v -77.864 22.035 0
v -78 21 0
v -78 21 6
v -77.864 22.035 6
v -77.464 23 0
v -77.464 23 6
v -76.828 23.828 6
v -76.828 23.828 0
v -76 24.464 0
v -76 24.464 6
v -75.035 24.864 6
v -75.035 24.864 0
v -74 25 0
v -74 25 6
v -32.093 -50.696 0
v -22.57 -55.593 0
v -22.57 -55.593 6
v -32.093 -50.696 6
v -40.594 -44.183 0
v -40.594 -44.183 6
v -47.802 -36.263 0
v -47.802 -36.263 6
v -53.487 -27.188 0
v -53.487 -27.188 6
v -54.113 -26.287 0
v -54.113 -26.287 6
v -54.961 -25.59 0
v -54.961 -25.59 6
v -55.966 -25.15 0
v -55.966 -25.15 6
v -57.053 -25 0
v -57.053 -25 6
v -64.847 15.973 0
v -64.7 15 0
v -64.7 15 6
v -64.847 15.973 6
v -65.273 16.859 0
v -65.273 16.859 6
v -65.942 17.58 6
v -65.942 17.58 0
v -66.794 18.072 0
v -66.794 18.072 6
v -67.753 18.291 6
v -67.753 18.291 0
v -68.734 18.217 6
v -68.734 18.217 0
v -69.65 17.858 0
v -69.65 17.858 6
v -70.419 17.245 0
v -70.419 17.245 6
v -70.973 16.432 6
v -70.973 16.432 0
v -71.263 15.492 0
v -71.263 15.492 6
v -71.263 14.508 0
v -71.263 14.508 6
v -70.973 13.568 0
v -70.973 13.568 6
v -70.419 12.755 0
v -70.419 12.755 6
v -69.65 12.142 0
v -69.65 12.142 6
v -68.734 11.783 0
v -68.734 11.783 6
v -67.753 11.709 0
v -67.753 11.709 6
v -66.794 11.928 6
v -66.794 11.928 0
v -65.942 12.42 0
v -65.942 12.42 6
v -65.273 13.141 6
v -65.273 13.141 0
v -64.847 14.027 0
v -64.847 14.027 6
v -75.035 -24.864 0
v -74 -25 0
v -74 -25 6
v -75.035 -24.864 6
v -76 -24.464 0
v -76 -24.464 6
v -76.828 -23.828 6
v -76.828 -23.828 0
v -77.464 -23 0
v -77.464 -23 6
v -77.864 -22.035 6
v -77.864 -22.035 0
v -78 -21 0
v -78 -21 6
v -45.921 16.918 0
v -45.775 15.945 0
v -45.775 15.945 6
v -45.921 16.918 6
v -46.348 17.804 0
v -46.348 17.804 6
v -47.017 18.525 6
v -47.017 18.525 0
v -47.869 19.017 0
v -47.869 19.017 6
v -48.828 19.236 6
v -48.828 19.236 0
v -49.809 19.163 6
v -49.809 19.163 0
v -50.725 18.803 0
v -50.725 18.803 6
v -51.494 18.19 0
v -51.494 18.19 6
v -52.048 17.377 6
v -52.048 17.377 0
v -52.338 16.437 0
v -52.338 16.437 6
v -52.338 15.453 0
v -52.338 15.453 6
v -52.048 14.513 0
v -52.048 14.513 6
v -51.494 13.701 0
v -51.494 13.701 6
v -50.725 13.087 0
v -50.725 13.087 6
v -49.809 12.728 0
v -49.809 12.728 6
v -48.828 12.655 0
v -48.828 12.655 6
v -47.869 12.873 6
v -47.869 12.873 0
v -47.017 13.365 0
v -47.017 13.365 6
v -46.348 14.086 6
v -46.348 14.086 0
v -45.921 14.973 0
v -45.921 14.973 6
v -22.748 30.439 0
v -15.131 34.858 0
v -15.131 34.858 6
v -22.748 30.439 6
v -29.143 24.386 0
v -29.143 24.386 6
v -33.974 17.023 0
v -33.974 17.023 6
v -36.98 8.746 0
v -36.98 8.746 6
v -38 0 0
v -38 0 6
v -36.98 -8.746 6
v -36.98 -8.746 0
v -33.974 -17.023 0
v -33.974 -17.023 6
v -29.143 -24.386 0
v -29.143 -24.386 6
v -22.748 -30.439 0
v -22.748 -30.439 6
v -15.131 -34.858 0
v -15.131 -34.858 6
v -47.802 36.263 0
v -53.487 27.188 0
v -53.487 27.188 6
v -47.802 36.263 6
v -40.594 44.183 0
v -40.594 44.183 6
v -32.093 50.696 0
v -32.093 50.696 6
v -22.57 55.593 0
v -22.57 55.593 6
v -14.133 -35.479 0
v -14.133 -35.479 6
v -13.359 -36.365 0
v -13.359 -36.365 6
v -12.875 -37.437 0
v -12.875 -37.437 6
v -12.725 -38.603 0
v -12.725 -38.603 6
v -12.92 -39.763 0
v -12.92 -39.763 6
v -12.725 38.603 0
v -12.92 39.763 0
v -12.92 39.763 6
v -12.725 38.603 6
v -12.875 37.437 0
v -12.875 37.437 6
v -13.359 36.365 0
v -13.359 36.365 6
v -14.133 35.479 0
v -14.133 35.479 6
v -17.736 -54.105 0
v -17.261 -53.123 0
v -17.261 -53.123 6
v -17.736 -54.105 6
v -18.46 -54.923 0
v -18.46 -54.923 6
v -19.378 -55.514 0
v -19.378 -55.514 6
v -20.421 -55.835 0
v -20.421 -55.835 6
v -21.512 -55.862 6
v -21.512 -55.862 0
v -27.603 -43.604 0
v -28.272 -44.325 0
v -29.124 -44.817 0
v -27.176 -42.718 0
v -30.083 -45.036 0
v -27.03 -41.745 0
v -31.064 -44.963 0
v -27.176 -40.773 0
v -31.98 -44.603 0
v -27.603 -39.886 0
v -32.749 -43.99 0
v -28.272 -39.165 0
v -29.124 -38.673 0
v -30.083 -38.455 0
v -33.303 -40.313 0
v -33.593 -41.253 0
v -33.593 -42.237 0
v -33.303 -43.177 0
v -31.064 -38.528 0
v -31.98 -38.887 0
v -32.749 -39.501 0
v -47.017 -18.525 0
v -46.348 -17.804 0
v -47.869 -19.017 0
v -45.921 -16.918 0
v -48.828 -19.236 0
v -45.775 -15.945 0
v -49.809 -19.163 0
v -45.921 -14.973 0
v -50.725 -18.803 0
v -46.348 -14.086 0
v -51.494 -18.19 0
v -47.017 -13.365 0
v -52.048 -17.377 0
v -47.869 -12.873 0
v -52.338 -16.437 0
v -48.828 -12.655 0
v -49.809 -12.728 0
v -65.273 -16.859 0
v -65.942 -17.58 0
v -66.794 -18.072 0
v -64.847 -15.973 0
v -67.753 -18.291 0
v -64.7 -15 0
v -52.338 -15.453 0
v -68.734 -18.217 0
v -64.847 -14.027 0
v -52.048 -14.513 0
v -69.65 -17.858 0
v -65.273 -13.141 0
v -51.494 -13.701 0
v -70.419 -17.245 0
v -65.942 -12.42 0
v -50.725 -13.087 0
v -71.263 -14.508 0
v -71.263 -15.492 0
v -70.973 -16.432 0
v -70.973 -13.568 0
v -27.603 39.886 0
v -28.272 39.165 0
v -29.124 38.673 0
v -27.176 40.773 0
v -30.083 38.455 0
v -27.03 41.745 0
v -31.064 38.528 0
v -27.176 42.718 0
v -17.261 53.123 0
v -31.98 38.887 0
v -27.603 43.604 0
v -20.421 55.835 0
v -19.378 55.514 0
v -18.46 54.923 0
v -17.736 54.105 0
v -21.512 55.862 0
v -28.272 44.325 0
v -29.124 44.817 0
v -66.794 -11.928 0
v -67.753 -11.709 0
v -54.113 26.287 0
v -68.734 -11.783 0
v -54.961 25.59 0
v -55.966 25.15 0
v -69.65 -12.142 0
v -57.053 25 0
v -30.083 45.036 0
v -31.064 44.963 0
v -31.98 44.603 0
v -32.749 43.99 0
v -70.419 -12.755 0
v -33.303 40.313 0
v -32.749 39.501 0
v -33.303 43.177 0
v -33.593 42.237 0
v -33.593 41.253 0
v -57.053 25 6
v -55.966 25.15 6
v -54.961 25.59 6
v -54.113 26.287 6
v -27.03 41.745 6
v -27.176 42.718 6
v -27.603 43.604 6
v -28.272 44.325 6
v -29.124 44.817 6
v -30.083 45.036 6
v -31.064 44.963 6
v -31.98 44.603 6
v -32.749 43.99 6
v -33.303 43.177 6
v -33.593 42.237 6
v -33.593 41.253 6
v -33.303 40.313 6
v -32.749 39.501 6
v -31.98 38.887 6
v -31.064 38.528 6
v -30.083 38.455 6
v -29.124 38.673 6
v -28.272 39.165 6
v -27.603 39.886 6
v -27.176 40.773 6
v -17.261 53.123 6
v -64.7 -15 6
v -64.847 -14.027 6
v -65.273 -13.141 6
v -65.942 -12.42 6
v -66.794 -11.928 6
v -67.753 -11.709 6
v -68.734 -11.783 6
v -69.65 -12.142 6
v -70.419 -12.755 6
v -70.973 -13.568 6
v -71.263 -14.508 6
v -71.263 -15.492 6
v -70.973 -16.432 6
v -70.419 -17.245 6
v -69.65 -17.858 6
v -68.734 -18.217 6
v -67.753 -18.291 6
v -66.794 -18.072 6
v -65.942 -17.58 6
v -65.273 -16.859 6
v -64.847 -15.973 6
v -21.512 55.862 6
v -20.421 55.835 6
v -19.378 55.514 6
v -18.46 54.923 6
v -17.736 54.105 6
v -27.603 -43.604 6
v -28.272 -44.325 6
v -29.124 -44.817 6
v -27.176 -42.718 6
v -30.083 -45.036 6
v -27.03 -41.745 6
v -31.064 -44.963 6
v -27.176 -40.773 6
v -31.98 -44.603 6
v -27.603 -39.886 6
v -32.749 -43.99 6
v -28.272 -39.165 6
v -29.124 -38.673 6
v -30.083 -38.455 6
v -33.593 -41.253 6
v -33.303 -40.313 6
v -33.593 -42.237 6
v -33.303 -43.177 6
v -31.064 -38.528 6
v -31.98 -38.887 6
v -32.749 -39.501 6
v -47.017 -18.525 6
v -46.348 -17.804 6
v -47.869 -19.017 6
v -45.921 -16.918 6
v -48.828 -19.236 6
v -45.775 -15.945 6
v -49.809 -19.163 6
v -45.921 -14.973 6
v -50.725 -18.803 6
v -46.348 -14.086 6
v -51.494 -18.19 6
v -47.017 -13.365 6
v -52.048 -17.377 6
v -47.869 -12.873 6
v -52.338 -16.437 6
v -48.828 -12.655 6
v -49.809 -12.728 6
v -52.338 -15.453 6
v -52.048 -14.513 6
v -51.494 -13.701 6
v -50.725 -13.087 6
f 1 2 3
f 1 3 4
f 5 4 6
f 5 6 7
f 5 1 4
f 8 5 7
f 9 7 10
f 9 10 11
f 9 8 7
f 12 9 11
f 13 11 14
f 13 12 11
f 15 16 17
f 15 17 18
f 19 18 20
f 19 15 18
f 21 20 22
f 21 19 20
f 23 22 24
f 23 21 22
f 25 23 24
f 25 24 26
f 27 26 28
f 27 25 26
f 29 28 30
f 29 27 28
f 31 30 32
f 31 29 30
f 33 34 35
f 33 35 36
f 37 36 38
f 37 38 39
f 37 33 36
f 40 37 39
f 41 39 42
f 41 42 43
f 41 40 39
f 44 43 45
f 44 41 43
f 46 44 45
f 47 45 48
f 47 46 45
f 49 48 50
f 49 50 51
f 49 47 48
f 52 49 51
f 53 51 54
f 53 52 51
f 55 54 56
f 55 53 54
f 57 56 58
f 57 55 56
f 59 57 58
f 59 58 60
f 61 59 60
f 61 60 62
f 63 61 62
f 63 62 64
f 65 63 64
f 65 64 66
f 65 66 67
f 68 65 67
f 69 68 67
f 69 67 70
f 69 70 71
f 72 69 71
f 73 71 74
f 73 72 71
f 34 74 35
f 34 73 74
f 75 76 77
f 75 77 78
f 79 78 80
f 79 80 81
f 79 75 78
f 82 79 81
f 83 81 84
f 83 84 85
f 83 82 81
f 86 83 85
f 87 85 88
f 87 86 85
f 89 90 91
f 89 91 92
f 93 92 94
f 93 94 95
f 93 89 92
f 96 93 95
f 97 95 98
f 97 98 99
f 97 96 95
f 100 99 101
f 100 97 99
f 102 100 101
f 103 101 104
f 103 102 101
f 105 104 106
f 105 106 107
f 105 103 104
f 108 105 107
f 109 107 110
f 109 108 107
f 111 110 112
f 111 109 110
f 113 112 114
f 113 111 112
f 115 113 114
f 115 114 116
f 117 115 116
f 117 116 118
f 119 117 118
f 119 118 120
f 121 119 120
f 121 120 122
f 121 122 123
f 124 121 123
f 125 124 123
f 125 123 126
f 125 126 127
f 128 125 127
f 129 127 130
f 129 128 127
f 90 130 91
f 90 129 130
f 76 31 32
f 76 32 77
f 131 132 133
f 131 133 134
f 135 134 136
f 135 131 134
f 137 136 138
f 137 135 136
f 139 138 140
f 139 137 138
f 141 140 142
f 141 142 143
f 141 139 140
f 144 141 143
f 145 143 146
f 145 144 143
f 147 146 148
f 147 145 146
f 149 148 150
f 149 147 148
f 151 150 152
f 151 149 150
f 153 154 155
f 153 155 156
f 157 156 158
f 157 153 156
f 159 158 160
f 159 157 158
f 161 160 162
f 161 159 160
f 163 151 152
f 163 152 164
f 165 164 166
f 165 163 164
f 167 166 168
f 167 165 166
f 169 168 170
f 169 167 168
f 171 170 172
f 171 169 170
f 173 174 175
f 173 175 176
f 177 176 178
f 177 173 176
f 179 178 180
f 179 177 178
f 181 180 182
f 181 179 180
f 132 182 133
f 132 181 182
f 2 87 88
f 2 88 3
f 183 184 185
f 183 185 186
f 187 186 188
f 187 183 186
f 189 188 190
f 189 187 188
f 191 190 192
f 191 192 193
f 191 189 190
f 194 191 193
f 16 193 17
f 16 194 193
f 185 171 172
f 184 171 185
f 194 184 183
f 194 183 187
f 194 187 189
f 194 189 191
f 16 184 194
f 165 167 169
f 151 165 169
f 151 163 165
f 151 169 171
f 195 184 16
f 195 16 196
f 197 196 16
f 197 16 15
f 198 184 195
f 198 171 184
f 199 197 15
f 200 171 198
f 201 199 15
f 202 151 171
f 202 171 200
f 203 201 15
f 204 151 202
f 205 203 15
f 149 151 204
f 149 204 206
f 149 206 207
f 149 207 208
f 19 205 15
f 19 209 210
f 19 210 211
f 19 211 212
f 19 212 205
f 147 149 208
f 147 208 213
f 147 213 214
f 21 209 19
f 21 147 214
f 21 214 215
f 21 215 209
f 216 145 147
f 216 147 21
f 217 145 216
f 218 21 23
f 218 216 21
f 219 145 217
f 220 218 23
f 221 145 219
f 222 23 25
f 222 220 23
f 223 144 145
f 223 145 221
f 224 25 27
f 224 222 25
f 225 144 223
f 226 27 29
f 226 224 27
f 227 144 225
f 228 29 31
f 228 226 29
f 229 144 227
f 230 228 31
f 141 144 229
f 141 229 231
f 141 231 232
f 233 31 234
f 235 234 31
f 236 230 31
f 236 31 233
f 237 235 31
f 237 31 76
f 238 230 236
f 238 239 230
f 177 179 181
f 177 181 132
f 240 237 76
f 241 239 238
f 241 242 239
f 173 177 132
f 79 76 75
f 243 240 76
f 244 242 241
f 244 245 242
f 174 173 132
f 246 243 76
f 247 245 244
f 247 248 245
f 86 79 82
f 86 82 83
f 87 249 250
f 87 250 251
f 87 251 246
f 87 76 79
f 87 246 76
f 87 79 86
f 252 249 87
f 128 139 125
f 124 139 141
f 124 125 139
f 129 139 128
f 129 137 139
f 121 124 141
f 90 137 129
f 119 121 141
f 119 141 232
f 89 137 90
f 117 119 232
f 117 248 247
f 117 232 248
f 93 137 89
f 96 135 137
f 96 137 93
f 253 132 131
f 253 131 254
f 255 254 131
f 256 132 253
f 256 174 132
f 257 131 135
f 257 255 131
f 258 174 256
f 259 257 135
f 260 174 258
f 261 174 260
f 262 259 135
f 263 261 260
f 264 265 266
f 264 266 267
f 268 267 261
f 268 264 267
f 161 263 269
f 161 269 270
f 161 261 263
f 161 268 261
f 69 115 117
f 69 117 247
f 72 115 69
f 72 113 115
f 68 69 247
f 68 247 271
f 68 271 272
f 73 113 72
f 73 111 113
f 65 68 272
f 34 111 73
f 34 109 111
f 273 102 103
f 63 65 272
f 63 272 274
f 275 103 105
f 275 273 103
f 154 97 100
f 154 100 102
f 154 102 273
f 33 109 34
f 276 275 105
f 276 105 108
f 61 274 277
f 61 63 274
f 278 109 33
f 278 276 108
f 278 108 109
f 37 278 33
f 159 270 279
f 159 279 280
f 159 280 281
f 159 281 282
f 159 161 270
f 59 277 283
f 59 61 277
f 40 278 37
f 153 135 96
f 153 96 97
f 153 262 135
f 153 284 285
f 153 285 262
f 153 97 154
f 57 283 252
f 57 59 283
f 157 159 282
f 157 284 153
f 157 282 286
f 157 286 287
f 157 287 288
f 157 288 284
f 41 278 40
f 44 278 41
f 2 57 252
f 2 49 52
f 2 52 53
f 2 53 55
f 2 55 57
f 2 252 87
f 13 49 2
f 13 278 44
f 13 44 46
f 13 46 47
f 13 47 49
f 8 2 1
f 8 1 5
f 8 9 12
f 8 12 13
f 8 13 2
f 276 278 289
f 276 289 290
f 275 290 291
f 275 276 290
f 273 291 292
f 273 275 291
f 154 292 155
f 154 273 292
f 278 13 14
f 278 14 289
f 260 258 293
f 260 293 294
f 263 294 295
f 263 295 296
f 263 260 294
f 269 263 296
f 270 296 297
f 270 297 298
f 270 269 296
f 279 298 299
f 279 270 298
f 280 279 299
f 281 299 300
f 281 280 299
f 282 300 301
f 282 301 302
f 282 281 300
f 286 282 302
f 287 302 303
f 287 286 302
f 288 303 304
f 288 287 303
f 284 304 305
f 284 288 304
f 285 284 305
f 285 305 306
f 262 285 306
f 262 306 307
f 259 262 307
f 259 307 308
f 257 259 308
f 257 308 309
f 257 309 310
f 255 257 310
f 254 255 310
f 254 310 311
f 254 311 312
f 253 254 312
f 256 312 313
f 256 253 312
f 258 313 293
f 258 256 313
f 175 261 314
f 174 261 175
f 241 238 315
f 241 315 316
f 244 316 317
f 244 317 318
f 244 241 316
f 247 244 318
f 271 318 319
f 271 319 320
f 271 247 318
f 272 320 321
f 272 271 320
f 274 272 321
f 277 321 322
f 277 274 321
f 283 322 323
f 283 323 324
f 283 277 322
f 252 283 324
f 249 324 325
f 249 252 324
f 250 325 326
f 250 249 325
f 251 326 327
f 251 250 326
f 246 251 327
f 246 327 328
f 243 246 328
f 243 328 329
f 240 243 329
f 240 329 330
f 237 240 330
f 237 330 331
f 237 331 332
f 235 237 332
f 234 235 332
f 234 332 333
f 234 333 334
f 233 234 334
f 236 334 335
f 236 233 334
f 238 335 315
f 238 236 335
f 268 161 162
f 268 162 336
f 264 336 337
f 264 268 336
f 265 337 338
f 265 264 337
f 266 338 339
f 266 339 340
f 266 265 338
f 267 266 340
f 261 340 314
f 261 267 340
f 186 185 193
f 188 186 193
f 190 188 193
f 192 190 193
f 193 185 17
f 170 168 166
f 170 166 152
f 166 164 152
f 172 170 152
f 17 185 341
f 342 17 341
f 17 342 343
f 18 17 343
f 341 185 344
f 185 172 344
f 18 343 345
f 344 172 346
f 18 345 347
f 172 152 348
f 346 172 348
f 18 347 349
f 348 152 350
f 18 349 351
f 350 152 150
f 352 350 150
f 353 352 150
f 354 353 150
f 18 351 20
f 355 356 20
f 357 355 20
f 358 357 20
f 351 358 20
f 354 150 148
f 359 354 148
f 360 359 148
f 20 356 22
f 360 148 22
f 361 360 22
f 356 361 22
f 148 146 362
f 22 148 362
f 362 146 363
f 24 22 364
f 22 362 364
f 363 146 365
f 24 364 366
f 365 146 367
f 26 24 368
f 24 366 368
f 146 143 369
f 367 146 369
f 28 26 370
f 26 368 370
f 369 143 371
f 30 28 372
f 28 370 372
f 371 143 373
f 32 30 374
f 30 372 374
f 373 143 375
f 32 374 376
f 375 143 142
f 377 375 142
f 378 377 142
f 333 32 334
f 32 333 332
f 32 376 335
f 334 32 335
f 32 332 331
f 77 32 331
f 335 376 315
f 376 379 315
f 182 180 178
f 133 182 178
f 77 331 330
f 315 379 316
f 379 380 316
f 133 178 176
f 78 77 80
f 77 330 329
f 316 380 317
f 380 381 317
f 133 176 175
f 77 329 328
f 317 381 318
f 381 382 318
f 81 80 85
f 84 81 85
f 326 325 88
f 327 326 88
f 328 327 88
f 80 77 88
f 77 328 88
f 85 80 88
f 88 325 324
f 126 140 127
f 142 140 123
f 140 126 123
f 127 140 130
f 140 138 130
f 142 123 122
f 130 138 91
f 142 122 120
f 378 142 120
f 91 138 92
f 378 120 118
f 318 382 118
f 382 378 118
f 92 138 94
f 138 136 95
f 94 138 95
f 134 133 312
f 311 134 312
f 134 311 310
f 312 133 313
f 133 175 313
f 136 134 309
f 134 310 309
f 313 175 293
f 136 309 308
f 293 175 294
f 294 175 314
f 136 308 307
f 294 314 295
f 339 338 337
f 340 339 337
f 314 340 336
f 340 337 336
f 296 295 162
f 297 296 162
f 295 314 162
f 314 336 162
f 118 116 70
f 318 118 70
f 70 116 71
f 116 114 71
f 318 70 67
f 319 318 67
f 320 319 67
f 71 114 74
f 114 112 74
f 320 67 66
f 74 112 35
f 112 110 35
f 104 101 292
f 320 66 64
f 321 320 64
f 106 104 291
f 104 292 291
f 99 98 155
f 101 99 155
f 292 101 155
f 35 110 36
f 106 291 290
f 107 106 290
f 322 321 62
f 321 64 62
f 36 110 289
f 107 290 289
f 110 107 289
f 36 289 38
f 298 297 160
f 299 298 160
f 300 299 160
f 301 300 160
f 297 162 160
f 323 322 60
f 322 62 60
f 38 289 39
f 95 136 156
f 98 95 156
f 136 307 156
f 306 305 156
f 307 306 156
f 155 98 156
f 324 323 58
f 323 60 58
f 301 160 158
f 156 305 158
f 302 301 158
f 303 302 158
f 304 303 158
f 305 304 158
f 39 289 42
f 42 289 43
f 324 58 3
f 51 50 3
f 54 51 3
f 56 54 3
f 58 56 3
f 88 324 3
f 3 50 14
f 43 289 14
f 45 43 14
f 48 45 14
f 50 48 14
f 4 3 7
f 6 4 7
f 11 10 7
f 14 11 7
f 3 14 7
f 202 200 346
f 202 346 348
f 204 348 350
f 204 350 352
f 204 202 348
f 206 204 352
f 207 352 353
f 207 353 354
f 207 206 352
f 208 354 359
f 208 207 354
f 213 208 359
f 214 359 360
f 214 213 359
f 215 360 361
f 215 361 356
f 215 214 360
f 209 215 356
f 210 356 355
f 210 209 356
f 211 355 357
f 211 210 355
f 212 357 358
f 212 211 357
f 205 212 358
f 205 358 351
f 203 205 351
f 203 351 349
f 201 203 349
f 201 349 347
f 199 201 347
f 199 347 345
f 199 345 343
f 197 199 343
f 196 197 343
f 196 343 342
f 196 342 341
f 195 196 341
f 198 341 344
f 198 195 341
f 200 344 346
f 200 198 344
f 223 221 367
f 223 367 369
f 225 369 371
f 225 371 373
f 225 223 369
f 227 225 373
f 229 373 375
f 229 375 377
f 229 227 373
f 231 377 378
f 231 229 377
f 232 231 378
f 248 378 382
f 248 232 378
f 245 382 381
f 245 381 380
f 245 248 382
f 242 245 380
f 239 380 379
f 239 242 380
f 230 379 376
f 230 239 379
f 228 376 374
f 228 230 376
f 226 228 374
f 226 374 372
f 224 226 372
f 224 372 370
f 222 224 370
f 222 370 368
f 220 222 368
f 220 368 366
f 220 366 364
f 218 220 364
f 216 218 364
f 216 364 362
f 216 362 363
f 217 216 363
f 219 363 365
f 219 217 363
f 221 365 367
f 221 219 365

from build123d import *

# Parameters (mm, degrees)
SKETCH1_R           = 3.3
BOSS_EXTRUDE1_DEPTH = 6


with BuildPart() as part:
    # Sketch1 → Boss-Extrude1 (new body)
    with BuildSketch(Plane.XY):
        with BuildLine():
            Line((-17.260749948, 53.123125955), (-12.919719305, 39.762807409))
            ThreePointArc((-12.919719305, 39.762807409), (-13.077398812, 36.882750928), (-15.131188668, 34.857526153))
            ThreePointArc((-15.131188668, 34.857526153), (-38, 0), (-15.131188668, -34.857526153))
            ThreePointArc((-15.131188668, -34.857526153), (-13.077398812, -36.882750928), (-12.919719305, -39.762807409))
            Line((-12.919719305, -39.762807409), (-17.260749948, -53.123125955))
            ThreePointArc((-17.260749948, -53.123125955), (-19.377542011, -55.513704705), (-22.569617157, -55.593276404))
            ThreePointArc((-22.569617157, -55.593276404), (-40.59393325, -44.182944485), (-53.486819346, -27.1875))
            ThreePointArc((-53.486819346, -27.1875), (-54.960957236, -25.590454576), (-57.052607302, -25))
            Line((-57.052607302, -25), (-74, -25))
            ThreePointArc((-74, -25), (-76.828427125, -23.828427125), (-78, -21))
            Line((-78, -21), (-78, 21))
            ThreePointArc((-78, 21), (-76.828427125, 23.828427125), (-74, 25))
            Line((-74, 25), (-57.052607302, 25))
            ThreePointArc((-57.052607302, 25), (-54.960957236, 25.590454576), (-53.486819346, 27.1875))
            ThreePointArc((-53.486819346, 27.1875), (-40.59393325, 44.182944485), (-22.569617157, 55.593276404))
            ThreePointArc((-22.569617157, 55.593276404), (-19.377542011, 55.513704705), (-17.260749948, 53.123125955))
        make_face()
        with Locations((-30.329719018, -41.74527691)):
            Circle(SKETCH1_R, mode=Mode.SUBTRACT)
        with Locations((-49.074516241, -15.94527691)):
            Circle(SKETCH1_R, mode=Mode.SUBTRACT)
        with Locations((-49.074516241, 15.94527691)):
            Circle(SKETCH1_R, mode=Mode.SUBTRACT)
        with Locations((-30.329719018, 41.74527691)):
            Circle(SKETCH1_R, mode=Mode.SUBTRACT)
        with Locations((-68, 15)):
            Circle(SKETCH1_R, mode=Mode.SUBTRACT)
        with Locations((-68, -15)):
            Circle(SKETCH1_R, mode=Mode.SUBTRACT)
    extrude(amount=BOSS_EXTRUDE1_DEPTH)


solid = part.part
